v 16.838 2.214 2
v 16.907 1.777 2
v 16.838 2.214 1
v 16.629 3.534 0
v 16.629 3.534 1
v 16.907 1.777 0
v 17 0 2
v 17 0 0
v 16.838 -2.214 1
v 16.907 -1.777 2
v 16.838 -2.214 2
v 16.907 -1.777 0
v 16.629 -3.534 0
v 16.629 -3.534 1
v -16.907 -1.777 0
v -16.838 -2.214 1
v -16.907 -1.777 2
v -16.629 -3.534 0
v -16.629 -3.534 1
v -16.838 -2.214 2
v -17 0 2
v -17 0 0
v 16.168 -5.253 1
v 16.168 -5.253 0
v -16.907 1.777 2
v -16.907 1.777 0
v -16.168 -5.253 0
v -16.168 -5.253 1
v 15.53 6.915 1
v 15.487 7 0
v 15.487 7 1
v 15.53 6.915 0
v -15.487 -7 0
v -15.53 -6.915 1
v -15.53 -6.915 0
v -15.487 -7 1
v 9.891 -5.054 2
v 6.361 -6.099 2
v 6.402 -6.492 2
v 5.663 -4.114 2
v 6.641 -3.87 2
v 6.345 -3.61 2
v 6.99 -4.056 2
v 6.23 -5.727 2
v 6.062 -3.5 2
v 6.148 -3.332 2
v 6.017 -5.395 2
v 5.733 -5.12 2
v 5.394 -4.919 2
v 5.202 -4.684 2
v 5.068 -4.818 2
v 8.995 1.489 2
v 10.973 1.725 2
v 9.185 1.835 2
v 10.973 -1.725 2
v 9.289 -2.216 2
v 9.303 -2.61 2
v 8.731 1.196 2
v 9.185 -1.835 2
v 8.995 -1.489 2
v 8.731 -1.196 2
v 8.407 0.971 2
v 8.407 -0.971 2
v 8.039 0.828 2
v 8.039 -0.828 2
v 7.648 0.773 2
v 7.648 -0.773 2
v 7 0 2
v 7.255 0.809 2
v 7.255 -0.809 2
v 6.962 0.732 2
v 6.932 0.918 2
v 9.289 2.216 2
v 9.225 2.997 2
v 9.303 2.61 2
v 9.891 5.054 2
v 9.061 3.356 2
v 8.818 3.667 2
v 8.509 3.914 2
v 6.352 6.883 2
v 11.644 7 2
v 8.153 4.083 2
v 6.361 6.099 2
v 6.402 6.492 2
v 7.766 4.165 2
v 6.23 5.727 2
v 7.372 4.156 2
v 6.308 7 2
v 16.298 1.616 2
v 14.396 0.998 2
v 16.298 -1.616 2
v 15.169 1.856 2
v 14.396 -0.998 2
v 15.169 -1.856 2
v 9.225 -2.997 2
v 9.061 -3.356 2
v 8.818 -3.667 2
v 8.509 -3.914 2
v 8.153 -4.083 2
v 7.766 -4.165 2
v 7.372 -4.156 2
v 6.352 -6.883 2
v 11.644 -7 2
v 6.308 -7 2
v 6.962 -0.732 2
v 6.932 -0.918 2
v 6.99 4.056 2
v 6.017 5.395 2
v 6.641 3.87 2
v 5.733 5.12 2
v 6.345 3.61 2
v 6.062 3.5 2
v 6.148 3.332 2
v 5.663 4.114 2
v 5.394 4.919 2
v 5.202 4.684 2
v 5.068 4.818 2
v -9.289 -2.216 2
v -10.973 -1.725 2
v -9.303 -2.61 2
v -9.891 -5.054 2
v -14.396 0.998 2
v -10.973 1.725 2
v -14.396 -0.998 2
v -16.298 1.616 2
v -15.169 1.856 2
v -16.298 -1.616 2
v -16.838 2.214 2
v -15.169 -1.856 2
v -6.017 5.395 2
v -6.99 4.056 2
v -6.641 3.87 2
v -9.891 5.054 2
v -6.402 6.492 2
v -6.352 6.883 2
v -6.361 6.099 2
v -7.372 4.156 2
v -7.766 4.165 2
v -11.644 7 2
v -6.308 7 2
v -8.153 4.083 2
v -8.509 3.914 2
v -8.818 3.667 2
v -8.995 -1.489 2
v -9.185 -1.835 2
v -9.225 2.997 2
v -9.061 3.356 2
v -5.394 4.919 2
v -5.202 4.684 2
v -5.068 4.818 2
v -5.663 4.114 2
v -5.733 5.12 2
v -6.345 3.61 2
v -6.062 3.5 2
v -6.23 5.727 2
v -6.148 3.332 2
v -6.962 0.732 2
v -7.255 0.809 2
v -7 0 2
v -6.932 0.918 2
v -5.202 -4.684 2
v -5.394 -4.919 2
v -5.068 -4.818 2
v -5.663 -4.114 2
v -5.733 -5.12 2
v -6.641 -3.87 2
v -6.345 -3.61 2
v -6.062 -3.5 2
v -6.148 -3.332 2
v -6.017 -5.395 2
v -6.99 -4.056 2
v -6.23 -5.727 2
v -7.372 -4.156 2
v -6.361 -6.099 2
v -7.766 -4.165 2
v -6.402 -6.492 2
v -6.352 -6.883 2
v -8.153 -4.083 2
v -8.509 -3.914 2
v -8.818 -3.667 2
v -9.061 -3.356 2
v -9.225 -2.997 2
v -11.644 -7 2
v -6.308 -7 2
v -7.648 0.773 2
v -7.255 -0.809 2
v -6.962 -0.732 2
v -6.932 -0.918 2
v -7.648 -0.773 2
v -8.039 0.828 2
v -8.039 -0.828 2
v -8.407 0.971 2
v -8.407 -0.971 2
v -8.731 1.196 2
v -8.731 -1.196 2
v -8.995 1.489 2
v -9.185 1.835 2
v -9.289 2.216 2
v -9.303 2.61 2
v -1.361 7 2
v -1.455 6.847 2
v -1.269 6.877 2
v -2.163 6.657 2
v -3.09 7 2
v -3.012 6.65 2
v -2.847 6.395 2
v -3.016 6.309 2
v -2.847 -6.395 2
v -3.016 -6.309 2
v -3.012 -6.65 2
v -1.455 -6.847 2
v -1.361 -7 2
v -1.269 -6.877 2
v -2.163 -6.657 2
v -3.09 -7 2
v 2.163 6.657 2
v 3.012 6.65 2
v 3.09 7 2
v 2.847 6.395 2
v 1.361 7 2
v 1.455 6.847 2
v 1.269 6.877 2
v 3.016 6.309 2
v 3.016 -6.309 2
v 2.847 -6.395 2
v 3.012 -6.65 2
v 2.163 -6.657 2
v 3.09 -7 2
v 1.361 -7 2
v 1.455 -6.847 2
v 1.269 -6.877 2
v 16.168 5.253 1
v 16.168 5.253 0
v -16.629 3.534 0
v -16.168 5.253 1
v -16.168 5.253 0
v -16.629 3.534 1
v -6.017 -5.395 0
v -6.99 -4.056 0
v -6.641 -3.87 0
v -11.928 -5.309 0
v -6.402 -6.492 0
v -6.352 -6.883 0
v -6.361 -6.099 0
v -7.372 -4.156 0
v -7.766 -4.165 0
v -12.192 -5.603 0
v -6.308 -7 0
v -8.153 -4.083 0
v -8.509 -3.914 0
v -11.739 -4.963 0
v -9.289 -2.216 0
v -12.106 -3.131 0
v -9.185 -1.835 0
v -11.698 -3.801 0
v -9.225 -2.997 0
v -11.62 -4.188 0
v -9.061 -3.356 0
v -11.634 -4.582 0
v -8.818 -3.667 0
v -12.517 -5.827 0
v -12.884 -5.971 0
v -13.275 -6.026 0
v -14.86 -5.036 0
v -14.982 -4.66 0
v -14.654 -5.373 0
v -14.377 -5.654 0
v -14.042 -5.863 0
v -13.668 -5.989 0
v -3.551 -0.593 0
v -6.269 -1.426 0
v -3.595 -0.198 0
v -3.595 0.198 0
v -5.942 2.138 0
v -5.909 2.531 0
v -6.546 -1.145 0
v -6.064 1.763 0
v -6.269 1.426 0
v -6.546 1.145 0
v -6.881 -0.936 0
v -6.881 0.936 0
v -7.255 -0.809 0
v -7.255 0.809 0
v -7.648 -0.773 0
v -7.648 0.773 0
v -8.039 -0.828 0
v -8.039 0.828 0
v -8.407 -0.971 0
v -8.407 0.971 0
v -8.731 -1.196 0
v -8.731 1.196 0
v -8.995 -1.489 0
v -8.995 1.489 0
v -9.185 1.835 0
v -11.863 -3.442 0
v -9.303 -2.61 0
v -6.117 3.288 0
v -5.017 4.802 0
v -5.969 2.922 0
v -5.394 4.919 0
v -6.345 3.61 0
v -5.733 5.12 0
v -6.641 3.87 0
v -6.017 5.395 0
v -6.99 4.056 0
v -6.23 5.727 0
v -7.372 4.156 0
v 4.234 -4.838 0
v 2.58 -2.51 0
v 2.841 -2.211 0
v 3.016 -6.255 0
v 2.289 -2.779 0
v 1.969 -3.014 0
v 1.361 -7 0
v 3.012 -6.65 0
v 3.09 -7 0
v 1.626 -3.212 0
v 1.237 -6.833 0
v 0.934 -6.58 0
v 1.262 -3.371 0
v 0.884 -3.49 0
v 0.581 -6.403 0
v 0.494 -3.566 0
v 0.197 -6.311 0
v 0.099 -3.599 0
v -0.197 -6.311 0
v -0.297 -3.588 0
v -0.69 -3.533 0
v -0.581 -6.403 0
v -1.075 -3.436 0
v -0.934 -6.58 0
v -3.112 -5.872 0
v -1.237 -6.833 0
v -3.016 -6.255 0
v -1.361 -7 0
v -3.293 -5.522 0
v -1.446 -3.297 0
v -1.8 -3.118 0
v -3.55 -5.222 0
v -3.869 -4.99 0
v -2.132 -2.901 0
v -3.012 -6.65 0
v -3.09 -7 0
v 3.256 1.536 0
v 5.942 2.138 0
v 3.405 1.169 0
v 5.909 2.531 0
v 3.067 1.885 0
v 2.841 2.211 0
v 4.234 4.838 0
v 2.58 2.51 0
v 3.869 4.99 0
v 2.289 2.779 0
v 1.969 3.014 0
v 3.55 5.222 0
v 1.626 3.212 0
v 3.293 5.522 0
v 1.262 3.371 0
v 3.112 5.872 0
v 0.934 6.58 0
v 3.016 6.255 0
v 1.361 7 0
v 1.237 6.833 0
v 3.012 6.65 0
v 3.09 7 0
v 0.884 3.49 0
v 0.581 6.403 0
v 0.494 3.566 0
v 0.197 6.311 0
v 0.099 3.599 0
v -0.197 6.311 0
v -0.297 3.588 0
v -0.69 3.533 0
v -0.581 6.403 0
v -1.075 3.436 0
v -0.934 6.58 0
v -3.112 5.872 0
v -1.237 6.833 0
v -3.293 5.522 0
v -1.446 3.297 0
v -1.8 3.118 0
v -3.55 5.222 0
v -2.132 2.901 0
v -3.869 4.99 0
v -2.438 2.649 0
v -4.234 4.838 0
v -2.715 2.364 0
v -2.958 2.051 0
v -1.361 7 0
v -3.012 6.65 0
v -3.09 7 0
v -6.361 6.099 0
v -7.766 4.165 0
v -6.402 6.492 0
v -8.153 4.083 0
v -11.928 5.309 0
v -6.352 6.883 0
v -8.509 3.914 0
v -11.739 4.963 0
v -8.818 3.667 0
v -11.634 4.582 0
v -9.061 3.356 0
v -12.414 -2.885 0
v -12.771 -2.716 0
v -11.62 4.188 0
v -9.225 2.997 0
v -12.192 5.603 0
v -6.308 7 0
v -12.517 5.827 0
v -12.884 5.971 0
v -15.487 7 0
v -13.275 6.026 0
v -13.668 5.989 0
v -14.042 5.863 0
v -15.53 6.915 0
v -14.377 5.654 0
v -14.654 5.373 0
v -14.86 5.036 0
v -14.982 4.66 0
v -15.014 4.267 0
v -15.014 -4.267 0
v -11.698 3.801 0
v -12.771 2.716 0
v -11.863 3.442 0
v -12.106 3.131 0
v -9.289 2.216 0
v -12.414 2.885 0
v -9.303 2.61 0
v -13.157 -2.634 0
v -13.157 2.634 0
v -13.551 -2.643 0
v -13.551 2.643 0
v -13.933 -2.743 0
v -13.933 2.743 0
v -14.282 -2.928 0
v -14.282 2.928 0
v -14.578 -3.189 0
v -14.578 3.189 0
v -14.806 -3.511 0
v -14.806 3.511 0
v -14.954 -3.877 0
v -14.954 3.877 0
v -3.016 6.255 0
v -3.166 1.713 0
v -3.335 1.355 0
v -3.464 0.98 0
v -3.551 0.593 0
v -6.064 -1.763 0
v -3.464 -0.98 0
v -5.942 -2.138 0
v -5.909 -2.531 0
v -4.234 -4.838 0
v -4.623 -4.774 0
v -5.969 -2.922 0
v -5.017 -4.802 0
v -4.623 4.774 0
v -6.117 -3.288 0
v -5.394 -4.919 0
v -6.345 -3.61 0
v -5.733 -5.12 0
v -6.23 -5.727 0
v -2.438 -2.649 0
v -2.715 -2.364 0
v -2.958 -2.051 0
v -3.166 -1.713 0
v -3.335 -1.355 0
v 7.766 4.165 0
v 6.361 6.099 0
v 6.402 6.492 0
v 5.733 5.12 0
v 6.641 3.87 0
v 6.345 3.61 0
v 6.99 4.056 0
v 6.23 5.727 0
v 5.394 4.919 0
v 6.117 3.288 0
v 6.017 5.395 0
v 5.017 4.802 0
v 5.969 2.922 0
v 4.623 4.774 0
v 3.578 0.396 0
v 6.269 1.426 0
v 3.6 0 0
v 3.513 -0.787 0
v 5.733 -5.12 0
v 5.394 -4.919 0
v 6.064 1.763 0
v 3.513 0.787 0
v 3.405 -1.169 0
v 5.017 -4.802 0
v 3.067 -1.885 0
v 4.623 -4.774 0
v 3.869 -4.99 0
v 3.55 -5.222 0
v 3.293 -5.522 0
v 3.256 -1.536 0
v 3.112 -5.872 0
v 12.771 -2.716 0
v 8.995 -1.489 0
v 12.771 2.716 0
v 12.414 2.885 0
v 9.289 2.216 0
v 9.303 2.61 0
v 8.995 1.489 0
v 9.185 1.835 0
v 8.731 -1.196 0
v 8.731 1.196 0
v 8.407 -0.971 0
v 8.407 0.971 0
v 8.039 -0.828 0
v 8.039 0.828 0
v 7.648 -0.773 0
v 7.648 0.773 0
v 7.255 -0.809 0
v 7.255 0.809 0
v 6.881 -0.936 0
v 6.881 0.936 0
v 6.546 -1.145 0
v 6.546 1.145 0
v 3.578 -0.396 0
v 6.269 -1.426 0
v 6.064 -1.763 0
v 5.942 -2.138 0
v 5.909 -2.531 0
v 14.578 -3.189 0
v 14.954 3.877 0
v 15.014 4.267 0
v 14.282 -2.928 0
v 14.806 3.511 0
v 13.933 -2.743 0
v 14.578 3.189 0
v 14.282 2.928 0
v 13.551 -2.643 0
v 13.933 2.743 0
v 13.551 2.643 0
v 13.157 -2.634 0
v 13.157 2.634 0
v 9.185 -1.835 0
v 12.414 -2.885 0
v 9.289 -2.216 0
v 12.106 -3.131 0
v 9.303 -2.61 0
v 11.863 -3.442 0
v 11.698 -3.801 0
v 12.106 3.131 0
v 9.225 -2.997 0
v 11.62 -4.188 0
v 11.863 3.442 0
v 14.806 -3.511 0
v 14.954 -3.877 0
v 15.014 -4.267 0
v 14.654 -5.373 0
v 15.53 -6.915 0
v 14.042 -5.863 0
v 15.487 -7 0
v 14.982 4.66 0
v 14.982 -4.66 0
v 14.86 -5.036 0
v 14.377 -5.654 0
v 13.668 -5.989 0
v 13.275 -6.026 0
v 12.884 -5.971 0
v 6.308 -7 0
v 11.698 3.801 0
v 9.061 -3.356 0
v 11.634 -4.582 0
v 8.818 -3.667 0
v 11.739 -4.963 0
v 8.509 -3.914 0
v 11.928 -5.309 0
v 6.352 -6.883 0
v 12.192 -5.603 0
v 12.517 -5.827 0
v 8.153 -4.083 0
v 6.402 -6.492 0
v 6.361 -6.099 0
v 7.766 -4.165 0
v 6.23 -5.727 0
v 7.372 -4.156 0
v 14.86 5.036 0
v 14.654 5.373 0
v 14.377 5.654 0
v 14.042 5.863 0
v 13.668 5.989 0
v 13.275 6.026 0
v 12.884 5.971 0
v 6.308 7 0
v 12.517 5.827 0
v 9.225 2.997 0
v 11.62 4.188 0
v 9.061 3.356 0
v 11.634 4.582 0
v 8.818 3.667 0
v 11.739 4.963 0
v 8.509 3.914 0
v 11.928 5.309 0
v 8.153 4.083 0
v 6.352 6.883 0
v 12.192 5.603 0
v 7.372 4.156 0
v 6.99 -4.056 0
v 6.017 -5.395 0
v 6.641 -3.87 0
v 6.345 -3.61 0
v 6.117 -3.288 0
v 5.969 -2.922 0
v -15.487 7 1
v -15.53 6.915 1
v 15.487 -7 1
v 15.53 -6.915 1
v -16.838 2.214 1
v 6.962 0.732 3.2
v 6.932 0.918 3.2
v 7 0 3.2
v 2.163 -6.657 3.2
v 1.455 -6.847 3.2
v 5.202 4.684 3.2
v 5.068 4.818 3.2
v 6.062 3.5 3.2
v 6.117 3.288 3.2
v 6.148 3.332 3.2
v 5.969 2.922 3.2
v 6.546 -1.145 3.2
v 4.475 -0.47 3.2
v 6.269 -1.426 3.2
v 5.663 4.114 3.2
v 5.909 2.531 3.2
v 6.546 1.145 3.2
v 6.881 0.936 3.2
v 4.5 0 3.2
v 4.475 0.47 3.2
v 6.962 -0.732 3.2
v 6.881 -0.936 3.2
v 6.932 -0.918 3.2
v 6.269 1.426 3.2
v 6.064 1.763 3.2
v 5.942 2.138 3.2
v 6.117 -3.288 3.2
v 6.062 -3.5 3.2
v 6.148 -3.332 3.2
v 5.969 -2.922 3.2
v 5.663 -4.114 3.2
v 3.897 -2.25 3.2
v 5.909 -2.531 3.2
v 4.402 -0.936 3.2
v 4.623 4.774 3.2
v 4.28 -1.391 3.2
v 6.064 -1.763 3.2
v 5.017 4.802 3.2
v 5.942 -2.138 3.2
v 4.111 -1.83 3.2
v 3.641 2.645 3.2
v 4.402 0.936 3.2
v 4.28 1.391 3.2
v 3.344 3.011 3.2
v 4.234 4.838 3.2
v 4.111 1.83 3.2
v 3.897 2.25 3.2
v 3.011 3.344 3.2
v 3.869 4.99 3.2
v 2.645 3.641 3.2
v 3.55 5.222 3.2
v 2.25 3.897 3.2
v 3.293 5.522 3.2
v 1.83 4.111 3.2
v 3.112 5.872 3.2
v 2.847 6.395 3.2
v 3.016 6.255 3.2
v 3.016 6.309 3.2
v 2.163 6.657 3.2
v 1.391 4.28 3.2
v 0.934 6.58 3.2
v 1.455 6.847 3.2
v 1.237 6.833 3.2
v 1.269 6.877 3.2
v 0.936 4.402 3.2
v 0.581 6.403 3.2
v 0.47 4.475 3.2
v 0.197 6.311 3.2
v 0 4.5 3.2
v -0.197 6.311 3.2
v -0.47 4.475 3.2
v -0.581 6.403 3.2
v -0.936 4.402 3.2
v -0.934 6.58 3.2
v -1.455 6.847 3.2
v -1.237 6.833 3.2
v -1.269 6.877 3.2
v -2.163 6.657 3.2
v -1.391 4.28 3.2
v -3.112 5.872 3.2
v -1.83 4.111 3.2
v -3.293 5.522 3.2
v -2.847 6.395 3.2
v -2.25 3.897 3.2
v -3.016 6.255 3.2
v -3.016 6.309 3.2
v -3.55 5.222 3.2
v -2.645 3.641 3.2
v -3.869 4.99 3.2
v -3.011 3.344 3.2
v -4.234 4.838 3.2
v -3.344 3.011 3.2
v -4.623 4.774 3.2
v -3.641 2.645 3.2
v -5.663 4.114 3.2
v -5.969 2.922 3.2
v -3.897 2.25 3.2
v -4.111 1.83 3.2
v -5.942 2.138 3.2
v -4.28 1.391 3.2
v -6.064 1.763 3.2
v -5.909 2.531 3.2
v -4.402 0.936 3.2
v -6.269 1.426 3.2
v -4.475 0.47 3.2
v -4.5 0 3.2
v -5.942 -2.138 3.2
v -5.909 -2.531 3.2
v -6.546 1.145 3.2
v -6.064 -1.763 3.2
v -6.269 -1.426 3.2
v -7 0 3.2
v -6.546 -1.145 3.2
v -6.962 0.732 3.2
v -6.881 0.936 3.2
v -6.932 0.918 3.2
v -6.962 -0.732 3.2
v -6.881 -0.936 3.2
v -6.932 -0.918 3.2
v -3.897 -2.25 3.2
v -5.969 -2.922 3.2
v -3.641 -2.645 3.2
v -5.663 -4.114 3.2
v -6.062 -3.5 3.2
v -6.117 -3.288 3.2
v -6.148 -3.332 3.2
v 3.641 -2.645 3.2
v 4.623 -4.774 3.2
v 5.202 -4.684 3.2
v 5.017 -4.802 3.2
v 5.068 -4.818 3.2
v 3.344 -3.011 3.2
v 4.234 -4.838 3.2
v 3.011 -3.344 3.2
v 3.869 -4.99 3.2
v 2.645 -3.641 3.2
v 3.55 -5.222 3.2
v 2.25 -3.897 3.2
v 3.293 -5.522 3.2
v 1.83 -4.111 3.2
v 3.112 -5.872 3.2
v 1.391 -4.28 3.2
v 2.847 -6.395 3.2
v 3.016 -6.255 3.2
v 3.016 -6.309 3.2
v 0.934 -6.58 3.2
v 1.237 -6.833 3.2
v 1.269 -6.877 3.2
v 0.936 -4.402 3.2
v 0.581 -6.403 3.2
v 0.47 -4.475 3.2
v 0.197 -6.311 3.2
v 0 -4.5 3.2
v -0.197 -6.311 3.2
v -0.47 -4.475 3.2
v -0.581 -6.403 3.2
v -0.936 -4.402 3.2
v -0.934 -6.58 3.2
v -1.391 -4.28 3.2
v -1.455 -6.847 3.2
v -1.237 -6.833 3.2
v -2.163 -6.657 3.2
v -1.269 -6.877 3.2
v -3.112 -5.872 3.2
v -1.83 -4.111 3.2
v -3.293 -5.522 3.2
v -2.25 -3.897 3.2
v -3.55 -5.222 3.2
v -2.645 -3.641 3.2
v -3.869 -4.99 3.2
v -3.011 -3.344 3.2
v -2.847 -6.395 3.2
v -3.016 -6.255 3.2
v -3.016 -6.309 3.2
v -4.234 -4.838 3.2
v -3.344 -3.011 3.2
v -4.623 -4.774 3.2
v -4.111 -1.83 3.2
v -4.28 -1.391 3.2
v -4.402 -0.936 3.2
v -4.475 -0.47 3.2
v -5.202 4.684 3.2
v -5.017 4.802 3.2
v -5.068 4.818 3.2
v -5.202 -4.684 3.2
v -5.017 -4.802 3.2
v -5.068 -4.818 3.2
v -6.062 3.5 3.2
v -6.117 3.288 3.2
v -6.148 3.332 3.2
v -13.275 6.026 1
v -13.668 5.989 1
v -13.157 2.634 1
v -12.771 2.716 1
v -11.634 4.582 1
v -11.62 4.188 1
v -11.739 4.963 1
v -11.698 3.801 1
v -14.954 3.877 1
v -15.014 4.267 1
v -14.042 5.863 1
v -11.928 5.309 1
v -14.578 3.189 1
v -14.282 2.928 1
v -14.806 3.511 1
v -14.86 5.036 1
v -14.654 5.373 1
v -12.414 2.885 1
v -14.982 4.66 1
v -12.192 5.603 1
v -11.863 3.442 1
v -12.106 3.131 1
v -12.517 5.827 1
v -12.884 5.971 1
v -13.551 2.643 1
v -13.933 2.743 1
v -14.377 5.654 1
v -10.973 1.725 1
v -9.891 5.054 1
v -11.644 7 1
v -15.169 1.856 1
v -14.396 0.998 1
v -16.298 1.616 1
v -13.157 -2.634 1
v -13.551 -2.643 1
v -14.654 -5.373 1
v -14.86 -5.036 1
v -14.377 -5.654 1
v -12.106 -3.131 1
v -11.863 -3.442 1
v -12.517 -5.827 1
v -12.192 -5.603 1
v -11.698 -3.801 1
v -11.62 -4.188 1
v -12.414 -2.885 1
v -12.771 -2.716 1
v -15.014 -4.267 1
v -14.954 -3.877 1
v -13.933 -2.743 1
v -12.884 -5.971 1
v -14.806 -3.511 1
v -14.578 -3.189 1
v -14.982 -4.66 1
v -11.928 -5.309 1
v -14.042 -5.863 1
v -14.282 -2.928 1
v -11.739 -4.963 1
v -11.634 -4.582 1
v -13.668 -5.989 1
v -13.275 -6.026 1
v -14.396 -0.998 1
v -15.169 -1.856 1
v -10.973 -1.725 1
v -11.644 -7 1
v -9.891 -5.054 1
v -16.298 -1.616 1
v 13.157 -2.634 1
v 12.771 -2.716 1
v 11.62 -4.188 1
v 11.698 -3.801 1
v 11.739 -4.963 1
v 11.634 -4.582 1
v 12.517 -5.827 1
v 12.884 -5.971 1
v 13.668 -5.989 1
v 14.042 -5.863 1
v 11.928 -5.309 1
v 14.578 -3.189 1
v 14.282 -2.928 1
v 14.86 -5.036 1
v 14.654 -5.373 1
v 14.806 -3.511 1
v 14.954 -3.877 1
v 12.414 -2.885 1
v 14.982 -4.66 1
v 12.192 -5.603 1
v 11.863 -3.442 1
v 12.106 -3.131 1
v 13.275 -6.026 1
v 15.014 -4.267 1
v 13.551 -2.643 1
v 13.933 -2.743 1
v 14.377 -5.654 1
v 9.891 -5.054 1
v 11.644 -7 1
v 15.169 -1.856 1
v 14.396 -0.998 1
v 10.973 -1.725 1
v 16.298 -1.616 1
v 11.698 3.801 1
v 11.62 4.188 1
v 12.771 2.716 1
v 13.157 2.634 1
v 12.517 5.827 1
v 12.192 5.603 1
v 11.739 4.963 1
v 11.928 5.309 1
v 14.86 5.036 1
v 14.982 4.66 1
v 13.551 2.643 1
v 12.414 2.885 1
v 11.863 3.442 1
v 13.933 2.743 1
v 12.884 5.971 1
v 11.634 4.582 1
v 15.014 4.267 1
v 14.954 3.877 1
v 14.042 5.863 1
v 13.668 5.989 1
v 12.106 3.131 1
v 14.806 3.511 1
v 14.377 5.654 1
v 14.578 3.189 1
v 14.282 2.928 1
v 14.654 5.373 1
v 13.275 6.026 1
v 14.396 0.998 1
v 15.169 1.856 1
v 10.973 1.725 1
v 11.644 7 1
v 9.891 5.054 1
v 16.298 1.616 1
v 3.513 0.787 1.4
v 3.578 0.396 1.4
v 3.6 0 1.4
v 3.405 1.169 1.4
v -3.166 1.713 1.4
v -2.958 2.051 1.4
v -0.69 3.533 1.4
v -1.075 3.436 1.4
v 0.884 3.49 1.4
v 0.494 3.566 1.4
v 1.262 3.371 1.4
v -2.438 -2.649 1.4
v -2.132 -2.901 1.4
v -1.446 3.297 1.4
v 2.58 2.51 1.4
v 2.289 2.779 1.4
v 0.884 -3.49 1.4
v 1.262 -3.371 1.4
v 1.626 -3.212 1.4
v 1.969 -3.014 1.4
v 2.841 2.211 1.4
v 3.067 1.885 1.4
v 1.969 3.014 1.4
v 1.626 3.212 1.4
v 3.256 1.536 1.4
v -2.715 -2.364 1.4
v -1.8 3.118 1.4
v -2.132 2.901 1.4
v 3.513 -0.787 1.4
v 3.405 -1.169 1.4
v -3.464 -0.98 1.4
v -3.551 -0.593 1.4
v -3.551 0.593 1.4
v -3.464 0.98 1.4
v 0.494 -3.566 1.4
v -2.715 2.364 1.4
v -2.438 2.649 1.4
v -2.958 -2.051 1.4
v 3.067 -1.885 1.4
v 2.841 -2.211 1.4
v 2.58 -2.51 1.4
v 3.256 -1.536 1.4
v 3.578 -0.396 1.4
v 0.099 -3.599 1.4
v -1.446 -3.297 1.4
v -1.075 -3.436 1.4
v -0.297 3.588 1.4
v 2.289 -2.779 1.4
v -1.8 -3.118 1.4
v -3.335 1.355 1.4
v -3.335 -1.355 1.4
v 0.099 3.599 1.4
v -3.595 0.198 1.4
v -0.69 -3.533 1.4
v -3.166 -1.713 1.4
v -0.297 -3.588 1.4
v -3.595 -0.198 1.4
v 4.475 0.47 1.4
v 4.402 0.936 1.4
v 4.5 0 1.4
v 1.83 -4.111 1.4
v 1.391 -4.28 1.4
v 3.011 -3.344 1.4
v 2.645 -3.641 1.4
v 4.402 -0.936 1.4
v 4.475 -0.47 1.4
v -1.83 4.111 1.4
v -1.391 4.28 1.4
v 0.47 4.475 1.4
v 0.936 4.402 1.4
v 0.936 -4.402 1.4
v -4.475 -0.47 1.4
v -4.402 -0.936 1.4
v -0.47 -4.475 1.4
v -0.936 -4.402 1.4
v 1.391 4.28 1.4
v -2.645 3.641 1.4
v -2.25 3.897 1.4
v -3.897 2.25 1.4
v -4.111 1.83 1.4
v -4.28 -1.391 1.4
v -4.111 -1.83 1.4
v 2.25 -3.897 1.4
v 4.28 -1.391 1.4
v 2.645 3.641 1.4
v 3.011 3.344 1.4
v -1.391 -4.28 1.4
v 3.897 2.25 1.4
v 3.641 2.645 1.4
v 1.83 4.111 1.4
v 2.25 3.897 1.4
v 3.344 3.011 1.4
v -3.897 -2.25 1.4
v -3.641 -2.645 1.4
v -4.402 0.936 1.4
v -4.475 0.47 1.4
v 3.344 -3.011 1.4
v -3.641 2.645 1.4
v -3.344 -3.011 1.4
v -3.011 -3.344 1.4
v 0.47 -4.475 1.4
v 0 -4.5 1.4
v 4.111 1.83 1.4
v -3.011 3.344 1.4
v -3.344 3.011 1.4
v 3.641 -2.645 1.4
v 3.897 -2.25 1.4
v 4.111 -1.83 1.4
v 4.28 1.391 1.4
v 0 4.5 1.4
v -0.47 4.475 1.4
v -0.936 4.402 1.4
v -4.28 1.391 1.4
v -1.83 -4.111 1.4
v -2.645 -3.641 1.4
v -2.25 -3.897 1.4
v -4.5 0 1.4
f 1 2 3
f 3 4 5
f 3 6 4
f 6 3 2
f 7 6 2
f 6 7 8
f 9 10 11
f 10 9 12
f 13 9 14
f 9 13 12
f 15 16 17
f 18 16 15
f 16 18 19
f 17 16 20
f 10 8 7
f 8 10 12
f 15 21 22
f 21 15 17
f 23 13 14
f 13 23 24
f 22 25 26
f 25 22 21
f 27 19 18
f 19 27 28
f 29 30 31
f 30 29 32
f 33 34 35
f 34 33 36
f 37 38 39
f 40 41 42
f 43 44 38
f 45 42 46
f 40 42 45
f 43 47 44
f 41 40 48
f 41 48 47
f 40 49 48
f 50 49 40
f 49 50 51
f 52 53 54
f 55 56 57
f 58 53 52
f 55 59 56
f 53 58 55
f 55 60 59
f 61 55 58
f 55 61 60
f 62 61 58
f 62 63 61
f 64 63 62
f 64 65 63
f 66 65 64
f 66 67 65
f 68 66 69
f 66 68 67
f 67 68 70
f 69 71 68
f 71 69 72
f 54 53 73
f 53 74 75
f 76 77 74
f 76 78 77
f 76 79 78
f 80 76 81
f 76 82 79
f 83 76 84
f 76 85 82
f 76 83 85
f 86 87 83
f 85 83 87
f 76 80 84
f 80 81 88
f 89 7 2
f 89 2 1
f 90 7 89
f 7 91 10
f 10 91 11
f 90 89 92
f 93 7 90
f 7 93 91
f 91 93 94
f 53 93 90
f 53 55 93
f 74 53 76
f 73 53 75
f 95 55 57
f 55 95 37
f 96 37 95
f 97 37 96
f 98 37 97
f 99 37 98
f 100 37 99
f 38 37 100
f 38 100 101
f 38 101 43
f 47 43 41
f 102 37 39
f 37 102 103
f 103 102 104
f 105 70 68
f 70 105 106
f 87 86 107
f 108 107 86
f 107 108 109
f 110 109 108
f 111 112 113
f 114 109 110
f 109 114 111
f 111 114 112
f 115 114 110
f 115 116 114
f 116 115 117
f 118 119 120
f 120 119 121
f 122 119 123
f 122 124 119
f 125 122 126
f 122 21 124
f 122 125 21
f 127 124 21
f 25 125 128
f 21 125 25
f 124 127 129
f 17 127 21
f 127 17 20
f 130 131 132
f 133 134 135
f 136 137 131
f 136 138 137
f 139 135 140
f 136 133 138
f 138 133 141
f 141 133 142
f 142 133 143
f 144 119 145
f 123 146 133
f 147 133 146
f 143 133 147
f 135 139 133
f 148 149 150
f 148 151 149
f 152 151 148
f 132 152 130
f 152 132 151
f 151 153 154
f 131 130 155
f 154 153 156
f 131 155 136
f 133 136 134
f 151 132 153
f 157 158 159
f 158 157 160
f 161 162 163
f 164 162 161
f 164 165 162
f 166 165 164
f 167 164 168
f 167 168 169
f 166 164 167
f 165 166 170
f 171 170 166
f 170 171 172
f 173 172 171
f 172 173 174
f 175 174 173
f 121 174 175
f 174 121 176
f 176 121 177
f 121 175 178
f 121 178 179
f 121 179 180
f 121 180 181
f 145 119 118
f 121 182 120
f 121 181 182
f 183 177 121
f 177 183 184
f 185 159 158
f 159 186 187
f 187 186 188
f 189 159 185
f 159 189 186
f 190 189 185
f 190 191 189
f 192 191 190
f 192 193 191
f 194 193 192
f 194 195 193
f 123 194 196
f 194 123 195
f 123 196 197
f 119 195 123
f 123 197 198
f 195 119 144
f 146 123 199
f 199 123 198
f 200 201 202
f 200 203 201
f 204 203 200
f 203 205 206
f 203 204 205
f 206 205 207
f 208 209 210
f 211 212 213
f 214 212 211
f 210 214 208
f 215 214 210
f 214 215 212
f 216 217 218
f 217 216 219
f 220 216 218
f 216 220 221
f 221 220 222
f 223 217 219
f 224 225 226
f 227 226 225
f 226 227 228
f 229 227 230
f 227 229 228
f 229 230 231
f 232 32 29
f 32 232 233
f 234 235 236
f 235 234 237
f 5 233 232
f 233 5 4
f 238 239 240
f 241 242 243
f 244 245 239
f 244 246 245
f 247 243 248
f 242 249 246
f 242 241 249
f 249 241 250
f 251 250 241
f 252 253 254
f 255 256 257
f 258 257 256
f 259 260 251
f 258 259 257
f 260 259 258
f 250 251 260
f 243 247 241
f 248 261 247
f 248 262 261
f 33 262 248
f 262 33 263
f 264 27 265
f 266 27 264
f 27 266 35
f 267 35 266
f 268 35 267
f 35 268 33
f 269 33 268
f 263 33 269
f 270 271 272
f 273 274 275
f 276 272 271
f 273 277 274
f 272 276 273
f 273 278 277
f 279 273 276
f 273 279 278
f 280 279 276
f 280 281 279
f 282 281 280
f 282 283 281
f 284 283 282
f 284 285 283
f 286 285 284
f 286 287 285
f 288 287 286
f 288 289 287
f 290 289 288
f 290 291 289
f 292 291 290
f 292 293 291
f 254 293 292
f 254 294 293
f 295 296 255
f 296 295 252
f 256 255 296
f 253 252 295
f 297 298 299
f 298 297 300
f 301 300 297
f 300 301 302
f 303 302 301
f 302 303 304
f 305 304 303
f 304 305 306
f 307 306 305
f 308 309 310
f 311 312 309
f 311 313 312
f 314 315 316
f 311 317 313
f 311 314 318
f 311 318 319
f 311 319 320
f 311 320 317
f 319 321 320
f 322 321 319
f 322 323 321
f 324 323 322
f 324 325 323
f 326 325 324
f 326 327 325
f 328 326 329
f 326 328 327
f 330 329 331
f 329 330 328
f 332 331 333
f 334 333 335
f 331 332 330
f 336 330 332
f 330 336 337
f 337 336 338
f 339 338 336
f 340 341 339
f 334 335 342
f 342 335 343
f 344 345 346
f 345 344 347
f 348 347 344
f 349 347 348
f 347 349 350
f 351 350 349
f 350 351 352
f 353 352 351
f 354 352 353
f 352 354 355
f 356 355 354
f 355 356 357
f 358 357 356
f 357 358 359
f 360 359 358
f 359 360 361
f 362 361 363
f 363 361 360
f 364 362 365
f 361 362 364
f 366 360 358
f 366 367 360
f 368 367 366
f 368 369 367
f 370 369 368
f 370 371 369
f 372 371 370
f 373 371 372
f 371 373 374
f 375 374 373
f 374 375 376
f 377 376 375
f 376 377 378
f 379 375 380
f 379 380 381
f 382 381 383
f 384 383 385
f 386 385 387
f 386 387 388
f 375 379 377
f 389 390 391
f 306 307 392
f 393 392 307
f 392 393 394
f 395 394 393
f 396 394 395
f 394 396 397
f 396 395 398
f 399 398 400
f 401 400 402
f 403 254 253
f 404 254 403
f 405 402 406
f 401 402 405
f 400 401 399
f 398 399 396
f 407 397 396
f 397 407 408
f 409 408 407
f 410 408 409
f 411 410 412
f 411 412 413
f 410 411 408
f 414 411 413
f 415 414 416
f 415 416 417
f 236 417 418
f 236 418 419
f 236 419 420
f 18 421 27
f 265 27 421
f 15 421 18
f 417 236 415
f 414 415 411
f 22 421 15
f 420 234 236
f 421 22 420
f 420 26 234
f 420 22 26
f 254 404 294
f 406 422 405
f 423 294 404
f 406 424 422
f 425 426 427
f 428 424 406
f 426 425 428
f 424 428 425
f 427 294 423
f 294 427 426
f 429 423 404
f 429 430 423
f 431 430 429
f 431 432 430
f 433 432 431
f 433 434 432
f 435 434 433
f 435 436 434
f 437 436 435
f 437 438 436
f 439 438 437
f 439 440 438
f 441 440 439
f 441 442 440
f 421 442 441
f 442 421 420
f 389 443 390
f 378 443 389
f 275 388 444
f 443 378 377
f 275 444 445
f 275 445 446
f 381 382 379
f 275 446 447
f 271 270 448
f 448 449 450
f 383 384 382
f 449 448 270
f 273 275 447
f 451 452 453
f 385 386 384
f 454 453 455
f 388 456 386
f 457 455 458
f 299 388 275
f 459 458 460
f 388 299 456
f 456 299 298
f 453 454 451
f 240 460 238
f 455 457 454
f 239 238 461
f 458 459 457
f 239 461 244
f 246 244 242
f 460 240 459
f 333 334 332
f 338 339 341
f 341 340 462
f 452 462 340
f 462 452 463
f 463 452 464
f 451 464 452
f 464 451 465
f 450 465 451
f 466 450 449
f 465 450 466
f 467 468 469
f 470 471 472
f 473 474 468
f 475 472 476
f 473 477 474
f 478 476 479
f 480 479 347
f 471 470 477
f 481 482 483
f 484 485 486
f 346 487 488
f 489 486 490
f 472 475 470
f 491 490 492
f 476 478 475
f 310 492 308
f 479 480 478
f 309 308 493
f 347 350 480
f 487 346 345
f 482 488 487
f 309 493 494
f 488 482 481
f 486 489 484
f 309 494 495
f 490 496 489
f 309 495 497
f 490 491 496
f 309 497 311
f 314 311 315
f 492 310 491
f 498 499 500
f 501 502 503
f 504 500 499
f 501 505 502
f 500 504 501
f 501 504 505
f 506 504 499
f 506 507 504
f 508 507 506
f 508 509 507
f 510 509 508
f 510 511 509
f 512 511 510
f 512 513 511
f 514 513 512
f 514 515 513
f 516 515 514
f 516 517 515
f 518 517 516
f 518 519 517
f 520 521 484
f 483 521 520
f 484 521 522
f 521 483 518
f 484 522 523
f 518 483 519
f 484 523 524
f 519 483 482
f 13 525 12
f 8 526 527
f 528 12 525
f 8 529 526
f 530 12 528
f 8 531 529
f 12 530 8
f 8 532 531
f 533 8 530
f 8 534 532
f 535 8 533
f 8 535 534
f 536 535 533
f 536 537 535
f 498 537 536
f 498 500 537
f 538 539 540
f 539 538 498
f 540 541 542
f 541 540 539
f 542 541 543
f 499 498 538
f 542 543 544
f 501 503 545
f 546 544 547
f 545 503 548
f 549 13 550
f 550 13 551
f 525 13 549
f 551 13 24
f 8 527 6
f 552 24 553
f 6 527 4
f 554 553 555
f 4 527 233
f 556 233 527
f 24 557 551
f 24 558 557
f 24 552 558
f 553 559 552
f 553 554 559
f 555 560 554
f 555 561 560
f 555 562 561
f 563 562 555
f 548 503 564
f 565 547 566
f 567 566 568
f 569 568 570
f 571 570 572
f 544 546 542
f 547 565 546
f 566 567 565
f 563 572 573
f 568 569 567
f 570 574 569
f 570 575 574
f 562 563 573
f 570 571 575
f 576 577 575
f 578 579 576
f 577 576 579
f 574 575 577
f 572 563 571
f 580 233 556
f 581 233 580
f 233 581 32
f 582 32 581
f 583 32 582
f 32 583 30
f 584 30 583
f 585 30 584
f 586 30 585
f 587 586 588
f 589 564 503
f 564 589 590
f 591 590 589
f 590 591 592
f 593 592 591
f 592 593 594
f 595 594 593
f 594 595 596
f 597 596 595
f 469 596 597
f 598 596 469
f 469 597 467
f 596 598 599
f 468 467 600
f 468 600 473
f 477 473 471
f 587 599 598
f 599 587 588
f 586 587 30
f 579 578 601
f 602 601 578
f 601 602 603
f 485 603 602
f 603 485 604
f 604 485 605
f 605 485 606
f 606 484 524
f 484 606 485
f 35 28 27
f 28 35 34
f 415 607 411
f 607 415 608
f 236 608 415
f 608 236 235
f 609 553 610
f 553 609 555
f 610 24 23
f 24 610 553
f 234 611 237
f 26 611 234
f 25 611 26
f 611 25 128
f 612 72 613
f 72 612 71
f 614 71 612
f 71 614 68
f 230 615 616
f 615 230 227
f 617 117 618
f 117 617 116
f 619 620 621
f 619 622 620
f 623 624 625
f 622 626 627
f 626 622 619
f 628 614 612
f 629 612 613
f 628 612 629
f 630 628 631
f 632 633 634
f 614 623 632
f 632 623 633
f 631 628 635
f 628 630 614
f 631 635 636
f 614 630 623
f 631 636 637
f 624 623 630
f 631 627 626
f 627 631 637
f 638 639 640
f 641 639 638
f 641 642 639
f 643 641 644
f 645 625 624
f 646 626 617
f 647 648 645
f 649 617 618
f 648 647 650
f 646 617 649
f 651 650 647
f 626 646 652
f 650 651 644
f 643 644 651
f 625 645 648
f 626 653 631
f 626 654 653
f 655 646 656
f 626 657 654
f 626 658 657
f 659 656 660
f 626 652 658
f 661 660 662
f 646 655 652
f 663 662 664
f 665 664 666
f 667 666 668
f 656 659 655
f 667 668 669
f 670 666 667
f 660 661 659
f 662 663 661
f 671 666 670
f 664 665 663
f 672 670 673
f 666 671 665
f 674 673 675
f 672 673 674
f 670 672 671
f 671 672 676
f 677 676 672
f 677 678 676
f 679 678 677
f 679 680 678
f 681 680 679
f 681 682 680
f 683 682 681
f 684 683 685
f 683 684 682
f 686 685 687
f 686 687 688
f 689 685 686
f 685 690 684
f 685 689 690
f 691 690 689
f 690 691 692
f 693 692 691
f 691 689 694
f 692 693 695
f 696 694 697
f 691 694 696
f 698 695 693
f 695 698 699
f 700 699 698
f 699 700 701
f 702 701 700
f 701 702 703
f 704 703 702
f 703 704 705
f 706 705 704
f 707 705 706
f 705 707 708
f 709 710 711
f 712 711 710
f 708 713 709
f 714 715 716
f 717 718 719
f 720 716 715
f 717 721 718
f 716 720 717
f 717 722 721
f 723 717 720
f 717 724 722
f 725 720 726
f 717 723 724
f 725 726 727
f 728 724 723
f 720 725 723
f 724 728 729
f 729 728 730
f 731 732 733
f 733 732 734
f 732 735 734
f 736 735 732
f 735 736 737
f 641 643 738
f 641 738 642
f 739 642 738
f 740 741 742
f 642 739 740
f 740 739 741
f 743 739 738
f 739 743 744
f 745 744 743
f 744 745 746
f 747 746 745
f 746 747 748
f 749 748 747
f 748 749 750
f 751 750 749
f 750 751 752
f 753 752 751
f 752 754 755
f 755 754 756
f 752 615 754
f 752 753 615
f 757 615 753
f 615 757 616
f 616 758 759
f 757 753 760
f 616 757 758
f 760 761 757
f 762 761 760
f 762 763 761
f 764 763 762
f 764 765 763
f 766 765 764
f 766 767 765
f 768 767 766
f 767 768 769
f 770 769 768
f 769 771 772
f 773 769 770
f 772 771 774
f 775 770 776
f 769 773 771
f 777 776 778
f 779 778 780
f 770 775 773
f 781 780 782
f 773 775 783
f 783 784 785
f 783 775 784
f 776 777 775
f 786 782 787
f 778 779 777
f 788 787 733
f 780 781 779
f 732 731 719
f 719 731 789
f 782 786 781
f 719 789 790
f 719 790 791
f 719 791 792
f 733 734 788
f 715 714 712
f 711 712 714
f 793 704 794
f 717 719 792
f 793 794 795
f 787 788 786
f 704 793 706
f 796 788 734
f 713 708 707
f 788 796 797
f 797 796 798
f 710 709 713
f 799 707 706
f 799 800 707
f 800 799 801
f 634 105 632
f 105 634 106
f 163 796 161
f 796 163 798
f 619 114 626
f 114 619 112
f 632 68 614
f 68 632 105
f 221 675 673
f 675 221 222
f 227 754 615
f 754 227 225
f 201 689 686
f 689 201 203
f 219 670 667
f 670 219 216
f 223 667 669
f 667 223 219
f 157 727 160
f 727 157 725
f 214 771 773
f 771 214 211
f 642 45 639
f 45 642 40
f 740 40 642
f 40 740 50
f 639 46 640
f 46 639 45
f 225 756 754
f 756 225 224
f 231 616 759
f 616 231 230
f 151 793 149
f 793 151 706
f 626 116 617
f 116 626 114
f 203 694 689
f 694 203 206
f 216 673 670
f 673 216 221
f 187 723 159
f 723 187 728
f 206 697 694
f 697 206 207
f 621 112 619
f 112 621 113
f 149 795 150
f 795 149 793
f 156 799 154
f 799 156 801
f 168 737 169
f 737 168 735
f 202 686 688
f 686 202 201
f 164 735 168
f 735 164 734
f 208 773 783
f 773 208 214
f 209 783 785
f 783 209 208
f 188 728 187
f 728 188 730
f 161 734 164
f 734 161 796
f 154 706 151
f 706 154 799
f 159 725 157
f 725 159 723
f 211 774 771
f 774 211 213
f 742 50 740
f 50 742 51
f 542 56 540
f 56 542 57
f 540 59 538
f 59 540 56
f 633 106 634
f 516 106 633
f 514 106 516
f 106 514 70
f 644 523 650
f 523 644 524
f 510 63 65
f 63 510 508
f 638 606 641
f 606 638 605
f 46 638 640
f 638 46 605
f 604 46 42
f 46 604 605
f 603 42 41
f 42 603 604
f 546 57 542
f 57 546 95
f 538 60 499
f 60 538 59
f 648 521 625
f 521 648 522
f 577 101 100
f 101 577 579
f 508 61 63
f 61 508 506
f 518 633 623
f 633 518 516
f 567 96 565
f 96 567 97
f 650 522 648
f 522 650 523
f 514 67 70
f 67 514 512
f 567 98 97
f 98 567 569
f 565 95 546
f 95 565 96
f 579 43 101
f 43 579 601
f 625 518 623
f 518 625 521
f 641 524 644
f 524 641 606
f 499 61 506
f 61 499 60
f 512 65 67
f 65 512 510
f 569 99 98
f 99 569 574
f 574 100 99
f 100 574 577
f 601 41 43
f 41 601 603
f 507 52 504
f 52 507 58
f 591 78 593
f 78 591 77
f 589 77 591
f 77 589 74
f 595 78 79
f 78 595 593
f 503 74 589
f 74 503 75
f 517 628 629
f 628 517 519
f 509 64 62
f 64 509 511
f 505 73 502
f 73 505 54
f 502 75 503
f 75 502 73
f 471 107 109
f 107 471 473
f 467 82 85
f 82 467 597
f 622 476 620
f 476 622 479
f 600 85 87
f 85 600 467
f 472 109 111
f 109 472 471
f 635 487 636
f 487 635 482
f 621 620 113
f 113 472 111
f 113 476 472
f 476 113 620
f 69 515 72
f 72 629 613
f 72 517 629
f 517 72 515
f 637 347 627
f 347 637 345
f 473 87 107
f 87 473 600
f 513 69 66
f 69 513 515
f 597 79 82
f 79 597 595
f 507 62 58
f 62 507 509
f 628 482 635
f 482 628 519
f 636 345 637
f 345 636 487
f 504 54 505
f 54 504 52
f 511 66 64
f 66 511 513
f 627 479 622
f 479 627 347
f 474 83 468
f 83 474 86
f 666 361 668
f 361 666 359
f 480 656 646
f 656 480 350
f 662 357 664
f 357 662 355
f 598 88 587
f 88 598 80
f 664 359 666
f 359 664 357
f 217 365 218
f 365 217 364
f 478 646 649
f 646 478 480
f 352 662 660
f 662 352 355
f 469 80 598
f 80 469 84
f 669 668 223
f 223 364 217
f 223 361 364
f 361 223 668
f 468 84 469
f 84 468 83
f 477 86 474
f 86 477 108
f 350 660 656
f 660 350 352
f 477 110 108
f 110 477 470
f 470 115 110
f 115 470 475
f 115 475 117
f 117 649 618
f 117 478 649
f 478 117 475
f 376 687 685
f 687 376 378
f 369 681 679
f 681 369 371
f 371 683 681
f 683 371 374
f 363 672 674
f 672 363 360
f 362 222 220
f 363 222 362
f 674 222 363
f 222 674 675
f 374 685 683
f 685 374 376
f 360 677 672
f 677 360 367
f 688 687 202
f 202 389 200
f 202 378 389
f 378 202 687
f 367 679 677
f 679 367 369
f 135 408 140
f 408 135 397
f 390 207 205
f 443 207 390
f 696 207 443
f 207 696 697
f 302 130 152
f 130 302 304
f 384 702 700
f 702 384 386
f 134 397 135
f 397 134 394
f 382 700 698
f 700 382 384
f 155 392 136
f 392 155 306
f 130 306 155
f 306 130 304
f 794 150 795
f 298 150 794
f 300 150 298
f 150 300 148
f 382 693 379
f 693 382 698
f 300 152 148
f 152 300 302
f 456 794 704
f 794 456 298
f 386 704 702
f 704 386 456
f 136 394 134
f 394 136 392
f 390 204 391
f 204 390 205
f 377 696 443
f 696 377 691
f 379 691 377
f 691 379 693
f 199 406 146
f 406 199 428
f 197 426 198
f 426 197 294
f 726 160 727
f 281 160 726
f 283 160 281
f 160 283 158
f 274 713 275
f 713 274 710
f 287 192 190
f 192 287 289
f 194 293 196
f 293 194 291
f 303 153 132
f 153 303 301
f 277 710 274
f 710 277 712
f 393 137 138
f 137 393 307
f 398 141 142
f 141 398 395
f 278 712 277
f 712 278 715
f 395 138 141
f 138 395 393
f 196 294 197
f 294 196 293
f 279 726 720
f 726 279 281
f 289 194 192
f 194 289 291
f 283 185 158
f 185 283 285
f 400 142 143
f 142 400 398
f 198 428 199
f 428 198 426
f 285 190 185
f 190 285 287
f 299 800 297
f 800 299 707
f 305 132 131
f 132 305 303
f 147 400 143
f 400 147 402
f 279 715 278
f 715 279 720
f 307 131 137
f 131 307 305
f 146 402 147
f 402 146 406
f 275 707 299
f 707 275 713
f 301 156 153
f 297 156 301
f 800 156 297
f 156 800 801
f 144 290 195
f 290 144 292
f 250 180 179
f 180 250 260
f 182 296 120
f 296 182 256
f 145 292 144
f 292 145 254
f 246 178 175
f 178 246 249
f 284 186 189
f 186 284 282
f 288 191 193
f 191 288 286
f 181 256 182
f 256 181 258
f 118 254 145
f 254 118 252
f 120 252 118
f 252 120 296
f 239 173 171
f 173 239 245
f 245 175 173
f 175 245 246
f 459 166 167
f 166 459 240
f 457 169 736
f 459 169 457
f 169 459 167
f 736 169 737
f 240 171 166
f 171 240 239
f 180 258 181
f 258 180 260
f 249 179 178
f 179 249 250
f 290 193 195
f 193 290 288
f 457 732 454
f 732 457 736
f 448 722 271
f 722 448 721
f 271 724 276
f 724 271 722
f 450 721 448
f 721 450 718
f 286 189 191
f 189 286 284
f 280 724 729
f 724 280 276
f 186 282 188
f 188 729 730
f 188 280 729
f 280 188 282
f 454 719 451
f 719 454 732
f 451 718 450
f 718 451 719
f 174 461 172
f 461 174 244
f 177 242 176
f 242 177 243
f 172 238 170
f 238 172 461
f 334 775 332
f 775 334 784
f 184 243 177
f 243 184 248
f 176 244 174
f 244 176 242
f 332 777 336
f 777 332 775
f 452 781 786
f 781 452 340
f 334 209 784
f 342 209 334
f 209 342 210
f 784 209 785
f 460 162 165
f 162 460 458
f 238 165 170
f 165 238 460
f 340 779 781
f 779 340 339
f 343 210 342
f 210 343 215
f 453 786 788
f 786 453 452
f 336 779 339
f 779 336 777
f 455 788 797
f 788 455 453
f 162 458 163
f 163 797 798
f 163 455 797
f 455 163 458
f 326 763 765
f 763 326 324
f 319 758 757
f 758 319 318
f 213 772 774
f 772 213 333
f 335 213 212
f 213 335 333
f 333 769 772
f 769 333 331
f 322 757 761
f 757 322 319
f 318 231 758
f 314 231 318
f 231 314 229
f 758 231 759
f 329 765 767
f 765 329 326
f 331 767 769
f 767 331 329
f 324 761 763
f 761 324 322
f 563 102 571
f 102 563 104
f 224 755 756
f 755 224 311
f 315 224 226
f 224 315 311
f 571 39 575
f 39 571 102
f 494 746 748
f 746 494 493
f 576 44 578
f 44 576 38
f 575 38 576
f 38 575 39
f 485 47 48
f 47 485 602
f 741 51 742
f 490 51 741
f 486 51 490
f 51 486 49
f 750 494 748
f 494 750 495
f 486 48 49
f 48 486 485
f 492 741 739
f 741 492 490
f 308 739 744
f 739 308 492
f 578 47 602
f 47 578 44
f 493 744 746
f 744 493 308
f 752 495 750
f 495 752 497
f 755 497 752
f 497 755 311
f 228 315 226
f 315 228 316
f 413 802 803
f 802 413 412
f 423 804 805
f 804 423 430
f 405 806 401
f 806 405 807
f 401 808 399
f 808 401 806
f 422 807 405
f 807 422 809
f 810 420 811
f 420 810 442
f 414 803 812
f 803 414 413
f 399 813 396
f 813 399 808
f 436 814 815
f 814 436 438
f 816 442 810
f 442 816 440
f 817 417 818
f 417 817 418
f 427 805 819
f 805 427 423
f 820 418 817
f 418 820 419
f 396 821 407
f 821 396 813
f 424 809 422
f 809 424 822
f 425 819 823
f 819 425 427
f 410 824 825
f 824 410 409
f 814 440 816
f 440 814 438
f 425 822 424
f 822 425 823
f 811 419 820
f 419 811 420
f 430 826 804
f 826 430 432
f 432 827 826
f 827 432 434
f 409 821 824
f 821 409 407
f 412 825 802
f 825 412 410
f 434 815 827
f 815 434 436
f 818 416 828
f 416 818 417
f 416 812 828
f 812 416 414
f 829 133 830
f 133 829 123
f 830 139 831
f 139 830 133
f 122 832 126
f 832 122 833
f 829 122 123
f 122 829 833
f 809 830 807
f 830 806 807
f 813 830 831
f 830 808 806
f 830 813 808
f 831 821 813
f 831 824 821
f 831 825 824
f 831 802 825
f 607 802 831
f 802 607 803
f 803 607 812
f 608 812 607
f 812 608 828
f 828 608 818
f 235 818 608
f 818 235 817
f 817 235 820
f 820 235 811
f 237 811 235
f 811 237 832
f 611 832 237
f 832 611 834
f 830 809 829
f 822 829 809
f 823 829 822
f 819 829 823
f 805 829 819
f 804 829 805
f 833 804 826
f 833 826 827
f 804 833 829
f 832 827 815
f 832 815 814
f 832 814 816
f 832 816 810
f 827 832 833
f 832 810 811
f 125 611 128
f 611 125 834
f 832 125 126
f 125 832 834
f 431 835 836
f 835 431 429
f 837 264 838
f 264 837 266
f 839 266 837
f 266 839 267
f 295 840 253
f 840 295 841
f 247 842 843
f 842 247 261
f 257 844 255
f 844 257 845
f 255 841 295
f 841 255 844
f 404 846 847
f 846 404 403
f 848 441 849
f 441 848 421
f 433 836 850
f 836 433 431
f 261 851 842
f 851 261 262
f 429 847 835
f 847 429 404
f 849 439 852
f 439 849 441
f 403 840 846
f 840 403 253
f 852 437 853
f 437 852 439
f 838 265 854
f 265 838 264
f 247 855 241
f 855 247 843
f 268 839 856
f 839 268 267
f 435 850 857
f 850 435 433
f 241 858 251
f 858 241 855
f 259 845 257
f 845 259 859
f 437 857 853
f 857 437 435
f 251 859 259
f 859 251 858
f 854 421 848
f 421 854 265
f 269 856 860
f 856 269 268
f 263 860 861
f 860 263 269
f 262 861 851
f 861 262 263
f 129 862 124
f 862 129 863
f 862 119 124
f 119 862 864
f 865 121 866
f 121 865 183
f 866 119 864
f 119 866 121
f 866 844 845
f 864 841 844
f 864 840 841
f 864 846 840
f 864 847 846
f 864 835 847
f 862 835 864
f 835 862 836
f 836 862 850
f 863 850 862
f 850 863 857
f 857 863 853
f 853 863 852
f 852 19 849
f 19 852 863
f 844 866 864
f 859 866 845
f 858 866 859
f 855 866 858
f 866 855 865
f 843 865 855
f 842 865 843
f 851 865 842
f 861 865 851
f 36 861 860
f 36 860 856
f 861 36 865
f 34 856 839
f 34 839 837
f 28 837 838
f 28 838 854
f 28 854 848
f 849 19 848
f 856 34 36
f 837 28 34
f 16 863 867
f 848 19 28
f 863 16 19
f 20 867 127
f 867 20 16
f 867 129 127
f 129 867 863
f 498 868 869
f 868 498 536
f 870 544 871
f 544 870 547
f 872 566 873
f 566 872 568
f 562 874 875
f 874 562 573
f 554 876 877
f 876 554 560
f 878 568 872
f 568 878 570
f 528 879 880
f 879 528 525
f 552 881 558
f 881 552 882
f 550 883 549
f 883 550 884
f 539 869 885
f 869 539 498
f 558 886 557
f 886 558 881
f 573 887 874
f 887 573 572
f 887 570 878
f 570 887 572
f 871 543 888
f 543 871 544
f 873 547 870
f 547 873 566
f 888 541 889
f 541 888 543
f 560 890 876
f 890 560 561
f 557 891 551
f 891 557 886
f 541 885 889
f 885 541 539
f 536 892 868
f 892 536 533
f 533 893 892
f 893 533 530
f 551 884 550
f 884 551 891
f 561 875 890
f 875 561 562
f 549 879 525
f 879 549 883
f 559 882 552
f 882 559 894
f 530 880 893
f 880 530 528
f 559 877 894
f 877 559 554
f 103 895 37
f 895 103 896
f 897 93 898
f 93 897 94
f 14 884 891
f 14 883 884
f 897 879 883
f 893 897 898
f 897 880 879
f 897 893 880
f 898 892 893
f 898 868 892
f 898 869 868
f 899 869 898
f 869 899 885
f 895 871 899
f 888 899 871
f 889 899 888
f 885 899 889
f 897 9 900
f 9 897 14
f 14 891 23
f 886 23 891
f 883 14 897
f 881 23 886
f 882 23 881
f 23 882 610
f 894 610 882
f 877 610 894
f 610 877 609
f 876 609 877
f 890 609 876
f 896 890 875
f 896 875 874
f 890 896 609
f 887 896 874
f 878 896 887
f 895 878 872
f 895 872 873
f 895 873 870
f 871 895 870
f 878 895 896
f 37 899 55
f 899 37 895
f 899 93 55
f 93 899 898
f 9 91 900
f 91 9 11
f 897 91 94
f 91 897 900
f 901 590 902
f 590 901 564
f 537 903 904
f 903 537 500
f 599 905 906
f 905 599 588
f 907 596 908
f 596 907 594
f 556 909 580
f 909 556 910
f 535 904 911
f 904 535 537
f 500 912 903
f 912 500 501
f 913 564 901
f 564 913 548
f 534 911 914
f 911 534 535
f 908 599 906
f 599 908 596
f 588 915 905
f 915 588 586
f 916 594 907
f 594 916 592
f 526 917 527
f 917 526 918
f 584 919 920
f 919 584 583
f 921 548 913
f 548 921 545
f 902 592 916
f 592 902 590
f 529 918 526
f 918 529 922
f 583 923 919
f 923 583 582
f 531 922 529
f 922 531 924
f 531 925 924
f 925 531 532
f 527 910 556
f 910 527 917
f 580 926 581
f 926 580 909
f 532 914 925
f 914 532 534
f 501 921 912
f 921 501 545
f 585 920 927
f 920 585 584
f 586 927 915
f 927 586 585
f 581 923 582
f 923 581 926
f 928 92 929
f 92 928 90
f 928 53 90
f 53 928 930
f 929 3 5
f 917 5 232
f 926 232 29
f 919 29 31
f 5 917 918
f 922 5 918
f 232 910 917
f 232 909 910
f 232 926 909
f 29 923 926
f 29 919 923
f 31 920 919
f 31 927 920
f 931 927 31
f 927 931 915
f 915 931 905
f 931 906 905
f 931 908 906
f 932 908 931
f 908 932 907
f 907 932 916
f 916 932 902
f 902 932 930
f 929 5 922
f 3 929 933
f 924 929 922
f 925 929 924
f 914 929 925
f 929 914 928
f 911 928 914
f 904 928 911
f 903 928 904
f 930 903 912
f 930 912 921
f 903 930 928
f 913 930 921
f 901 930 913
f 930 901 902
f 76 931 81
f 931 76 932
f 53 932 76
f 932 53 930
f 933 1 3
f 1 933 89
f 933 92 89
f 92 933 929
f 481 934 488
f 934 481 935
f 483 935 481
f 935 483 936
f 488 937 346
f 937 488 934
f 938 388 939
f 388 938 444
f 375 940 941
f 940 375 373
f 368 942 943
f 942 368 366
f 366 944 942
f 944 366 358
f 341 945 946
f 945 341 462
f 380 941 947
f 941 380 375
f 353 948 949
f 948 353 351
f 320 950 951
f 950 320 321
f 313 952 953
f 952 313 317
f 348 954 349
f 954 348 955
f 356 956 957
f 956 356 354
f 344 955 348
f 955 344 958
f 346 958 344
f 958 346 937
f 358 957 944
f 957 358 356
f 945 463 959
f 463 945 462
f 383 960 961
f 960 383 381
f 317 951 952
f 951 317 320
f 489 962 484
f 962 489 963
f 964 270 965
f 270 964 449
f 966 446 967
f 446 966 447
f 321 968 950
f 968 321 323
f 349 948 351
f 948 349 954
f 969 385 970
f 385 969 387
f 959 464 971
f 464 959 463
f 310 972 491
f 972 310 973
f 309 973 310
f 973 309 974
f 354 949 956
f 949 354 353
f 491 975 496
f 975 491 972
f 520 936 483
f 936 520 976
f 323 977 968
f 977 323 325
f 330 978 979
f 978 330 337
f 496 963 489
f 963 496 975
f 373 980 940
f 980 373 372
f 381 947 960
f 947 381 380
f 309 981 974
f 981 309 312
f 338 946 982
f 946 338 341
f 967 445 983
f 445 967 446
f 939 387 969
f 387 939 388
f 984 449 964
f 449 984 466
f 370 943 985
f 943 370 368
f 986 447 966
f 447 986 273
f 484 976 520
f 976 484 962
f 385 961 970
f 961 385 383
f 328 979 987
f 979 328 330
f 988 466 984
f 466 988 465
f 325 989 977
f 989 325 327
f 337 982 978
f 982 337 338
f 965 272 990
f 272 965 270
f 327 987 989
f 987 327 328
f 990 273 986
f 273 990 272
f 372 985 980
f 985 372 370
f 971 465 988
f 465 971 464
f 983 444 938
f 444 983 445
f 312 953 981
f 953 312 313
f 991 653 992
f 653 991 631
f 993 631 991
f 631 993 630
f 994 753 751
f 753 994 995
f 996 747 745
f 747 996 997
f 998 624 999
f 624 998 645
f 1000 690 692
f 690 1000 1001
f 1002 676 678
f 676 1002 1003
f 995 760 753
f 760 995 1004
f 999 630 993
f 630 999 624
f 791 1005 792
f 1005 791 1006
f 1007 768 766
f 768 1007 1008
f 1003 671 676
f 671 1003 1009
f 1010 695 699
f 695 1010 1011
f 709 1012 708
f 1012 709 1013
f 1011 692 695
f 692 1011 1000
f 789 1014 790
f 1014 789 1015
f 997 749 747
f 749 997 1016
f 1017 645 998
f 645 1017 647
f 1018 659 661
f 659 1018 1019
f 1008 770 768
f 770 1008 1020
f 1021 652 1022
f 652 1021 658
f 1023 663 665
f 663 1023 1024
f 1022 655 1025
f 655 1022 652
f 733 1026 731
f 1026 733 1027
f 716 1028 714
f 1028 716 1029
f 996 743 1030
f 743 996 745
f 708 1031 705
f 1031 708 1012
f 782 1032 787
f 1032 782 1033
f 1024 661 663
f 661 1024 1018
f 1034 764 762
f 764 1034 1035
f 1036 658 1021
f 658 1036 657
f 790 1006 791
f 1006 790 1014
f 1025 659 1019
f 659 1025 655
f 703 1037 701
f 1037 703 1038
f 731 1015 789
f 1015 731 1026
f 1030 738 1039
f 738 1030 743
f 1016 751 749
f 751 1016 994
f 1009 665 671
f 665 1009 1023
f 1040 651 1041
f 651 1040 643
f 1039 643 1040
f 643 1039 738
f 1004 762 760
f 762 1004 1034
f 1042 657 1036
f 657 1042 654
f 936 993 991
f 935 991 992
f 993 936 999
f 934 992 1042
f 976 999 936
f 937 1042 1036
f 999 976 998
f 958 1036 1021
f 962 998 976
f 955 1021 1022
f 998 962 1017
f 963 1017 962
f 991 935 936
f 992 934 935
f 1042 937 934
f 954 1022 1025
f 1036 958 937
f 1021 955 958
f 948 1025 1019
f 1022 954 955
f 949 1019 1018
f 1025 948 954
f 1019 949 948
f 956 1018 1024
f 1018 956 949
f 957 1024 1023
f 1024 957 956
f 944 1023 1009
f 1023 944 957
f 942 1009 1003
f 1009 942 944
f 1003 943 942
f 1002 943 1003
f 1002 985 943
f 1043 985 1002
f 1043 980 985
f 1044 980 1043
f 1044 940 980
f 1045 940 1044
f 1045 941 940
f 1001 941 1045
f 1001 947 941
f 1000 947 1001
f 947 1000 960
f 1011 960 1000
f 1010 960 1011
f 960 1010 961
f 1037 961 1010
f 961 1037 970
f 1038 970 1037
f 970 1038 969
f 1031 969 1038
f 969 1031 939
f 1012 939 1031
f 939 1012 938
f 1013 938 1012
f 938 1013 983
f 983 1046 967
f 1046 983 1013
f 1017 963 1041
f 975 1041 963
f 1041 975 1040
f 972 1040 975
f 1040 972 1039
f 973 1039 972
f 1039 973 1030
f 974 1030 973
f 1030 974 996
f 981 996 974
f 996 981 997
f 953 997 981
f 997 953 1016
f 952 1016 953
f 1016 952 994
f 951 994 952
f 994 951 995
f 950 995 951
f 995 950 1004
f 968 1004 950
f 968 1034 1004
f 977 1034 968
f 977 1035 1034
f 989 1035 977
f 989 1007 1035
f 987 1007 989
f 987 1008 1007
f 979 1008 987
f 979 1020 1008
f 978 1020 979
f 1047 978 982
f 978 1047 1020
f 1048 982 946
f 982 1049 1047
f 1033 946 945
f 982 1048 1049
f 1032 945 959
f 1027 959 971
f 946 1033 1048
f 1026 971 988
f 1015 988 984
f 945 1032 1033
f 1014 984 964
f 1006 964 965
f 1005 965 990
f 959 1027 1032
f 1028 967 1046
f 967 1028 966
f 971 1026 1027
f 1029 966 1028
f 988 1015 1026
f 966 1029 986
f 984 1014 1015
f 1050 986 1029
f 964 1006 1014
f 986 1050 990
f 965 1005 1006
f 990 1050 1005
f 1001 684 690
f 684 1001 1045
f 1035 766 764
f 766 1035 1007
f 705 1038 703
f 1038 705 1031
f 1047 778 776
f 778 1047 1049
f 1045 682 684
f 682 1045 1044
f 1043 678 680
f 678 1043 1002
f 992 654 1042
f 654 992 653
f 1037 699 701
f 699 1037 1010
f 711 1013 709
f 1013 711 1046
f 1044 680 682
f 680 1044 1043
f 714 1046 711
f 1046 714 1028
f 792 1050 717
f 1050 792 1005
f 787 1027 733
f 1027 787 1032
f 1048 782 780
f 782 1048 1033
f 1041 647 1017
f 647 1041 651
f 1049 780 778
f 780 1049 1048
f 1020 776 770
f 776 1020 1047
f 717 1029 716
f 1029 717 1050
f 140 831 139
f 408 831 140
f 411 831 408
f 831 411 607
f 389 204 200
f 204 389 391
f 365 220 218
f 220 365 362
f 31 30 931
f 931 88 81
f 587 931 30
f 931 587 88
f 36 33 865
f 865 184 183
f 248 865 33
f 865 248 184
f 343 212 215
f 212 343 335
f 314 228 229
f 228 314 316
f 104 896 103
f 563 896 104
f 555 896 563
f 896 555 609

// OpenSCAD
$fa = 6;
$fs = 0.4;

// distance of bottom of stator to bottom of grip = 10mm
// encoder fits into grip by 7.6mm

// => 17.6mm of the encoder is above the base of this

// top of encoder is 20mm from bottom of thread

// therefore thickness of 2.4

// thread is M7



difference() {
    union () {
        cylinder(d=34, h=2);
        // higher central mount
        cylinder(d=14, h=3.2);
    }
    
    cylinder(d=7.2, h=8);
    translate([0,0,1.4]) cylinder(d=9, h=8);
    
    //translate([0,-5,1.5]) cube([7, 10, 3], center=true);
    
    for (i=[0:9]) {
        rotate([0,0,(i*36) - 18]) translate([8,0,0]) cylinder(h=8, d=3.4);
    }
    
    for (i=[0,1,5,6]) {
        rotate([0,0,(i*36) - 18]) translate([-14,0,0]) cylinder(h=4, d=3.4);
        rotate([0,0,(i*36) - 18]) translate([-14,0,1]) rotate([0,0,90]) cylinder(d=7, h=4, $fn=6);
        // and again just to cut corners
        rotate([0,0,(i*36) - 18]) translate([-16,0,1]) rotate([0,0,90]) cylinder(d=7, h=4, $fn=6);
    }
    
    // cut the shape
    translate([-40,7,0]) cube([80,10,4]);
    mirror([0,1,0]) translate([-40,7,0]) cube([80,10,4]);
    
}
